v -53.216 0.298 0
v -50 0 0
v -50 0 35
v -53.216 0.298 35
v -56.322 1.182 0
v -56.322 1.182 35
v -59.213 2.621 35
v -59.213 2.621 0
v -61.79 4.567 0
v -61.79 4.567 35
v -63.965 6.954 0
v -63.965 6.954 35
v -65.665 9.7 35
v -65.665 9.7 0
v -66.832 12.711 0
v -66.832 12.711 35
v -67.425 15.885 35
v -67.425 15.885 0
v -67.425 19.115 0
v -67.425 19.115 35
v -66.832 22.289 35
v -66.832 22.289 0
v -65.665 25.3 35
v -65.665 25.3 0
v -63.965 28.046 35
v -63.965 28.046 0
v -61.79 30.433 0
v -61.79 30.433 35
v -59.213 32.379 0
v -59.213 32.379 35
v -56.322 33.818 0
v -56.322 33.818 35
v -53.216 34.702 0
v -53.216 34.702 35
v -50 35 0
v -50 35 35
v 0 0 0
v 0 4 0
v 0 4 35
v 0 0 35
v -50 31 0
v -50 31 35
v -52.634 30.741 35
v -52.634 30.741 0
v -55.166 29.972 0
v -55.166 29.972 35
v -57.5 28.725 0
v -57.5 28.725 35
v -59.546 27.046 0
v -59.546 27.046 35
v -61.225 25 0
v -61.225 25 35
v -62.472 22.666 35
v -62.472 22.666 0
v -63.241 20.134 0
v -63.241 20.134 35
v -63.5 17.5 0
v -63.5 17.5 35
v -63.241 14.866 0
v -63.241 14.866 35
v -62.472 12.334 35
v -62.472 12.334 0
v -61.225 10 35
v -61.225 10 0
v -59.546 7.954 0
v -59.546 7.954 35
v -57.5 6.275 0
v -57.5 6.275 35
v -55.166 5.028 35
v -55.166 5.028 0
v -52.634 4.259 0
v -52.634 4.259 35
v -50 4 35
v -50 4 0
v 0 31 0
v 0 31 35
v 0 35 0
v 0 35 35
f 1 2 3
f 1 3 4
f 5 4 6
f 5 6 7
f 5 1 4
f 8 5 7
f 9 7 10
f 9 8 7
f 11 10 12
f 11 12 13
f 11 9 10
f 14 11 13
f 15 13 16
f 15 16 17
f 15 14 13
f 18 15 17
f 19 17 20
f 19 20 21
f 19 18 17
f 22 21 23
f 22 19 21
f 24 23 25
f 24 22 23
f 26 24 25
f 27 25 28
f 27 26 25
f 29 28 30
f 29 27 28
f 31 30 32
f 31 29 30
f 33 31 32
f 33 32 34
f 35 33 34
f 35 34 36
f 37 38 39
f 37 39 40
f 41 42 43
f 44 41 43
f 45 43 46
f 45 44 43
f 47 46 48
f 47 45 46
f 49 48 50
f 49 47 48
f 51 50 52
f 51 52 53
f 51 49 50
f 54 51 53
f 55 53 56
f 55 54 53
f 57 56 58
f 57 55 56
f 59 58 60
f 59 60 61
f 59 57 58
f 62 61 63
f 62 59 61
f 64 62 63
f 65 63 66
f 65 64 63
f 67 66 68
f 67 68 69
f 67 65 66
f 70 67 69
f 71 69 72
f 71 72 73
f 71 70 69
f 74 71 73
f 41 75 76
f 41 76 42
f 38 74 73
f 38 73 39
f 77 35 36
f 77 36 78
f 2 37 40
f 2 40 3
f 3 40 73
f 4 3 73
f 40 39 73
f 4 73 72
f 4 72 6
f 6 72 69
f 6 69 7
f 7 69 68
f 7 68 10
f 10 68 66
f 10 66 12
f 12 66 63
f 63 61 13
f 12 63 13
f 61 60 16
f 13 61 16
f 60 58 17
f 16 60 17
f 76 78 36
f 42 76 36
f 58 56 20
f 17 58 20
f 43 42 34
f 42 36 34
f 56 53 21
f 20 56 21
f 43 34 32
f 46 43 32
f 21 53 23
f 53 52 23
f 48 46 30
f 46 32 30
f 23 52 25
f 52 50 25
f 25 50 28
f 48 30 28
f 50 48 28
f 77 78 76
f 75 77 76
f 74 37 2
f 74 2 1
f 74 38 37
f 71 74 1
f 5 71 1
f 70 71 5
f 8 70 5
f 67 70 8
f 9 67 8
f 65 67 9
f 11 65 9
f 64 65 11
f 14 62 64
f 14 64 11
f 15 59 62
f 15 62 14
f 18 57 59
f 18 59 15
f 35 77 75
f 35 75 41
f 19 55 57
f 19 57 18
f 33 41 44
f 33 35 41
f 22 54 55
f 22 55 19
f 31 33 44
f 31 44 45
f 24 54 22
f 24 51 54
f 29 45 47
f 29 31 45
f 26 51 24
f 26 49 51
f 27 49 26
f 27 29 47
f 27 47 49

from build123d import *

# Parameters (mm, degrees)
BOSS_EXTRU_1_DEPTH = 35


with BuildPart() as part:
    # Esquisse2 → Boss.-Extru.1 (new body)
    with BuildSketch(Plane.XY):
        with BuildLine():
            Line((0, 0), (-50, 0))
            ThreePointArc((-50, 0), (-67.5, 17.5), (-50, 35))
            Line((-50, 35), (0, 35))
            Line((0, 35), (0, 31))
            Line((0, 31), (-50, 31))
            ThreePointArc((-50, 31), (-63.5, 17.5), (-50, 4))
            Line((-50, 4), (0, 4))
            Line((0, 4), (0, 0))
        make_face()
    extrude(amount=BOSS_EXTRU_1_DEPTH)


solid = part.part
